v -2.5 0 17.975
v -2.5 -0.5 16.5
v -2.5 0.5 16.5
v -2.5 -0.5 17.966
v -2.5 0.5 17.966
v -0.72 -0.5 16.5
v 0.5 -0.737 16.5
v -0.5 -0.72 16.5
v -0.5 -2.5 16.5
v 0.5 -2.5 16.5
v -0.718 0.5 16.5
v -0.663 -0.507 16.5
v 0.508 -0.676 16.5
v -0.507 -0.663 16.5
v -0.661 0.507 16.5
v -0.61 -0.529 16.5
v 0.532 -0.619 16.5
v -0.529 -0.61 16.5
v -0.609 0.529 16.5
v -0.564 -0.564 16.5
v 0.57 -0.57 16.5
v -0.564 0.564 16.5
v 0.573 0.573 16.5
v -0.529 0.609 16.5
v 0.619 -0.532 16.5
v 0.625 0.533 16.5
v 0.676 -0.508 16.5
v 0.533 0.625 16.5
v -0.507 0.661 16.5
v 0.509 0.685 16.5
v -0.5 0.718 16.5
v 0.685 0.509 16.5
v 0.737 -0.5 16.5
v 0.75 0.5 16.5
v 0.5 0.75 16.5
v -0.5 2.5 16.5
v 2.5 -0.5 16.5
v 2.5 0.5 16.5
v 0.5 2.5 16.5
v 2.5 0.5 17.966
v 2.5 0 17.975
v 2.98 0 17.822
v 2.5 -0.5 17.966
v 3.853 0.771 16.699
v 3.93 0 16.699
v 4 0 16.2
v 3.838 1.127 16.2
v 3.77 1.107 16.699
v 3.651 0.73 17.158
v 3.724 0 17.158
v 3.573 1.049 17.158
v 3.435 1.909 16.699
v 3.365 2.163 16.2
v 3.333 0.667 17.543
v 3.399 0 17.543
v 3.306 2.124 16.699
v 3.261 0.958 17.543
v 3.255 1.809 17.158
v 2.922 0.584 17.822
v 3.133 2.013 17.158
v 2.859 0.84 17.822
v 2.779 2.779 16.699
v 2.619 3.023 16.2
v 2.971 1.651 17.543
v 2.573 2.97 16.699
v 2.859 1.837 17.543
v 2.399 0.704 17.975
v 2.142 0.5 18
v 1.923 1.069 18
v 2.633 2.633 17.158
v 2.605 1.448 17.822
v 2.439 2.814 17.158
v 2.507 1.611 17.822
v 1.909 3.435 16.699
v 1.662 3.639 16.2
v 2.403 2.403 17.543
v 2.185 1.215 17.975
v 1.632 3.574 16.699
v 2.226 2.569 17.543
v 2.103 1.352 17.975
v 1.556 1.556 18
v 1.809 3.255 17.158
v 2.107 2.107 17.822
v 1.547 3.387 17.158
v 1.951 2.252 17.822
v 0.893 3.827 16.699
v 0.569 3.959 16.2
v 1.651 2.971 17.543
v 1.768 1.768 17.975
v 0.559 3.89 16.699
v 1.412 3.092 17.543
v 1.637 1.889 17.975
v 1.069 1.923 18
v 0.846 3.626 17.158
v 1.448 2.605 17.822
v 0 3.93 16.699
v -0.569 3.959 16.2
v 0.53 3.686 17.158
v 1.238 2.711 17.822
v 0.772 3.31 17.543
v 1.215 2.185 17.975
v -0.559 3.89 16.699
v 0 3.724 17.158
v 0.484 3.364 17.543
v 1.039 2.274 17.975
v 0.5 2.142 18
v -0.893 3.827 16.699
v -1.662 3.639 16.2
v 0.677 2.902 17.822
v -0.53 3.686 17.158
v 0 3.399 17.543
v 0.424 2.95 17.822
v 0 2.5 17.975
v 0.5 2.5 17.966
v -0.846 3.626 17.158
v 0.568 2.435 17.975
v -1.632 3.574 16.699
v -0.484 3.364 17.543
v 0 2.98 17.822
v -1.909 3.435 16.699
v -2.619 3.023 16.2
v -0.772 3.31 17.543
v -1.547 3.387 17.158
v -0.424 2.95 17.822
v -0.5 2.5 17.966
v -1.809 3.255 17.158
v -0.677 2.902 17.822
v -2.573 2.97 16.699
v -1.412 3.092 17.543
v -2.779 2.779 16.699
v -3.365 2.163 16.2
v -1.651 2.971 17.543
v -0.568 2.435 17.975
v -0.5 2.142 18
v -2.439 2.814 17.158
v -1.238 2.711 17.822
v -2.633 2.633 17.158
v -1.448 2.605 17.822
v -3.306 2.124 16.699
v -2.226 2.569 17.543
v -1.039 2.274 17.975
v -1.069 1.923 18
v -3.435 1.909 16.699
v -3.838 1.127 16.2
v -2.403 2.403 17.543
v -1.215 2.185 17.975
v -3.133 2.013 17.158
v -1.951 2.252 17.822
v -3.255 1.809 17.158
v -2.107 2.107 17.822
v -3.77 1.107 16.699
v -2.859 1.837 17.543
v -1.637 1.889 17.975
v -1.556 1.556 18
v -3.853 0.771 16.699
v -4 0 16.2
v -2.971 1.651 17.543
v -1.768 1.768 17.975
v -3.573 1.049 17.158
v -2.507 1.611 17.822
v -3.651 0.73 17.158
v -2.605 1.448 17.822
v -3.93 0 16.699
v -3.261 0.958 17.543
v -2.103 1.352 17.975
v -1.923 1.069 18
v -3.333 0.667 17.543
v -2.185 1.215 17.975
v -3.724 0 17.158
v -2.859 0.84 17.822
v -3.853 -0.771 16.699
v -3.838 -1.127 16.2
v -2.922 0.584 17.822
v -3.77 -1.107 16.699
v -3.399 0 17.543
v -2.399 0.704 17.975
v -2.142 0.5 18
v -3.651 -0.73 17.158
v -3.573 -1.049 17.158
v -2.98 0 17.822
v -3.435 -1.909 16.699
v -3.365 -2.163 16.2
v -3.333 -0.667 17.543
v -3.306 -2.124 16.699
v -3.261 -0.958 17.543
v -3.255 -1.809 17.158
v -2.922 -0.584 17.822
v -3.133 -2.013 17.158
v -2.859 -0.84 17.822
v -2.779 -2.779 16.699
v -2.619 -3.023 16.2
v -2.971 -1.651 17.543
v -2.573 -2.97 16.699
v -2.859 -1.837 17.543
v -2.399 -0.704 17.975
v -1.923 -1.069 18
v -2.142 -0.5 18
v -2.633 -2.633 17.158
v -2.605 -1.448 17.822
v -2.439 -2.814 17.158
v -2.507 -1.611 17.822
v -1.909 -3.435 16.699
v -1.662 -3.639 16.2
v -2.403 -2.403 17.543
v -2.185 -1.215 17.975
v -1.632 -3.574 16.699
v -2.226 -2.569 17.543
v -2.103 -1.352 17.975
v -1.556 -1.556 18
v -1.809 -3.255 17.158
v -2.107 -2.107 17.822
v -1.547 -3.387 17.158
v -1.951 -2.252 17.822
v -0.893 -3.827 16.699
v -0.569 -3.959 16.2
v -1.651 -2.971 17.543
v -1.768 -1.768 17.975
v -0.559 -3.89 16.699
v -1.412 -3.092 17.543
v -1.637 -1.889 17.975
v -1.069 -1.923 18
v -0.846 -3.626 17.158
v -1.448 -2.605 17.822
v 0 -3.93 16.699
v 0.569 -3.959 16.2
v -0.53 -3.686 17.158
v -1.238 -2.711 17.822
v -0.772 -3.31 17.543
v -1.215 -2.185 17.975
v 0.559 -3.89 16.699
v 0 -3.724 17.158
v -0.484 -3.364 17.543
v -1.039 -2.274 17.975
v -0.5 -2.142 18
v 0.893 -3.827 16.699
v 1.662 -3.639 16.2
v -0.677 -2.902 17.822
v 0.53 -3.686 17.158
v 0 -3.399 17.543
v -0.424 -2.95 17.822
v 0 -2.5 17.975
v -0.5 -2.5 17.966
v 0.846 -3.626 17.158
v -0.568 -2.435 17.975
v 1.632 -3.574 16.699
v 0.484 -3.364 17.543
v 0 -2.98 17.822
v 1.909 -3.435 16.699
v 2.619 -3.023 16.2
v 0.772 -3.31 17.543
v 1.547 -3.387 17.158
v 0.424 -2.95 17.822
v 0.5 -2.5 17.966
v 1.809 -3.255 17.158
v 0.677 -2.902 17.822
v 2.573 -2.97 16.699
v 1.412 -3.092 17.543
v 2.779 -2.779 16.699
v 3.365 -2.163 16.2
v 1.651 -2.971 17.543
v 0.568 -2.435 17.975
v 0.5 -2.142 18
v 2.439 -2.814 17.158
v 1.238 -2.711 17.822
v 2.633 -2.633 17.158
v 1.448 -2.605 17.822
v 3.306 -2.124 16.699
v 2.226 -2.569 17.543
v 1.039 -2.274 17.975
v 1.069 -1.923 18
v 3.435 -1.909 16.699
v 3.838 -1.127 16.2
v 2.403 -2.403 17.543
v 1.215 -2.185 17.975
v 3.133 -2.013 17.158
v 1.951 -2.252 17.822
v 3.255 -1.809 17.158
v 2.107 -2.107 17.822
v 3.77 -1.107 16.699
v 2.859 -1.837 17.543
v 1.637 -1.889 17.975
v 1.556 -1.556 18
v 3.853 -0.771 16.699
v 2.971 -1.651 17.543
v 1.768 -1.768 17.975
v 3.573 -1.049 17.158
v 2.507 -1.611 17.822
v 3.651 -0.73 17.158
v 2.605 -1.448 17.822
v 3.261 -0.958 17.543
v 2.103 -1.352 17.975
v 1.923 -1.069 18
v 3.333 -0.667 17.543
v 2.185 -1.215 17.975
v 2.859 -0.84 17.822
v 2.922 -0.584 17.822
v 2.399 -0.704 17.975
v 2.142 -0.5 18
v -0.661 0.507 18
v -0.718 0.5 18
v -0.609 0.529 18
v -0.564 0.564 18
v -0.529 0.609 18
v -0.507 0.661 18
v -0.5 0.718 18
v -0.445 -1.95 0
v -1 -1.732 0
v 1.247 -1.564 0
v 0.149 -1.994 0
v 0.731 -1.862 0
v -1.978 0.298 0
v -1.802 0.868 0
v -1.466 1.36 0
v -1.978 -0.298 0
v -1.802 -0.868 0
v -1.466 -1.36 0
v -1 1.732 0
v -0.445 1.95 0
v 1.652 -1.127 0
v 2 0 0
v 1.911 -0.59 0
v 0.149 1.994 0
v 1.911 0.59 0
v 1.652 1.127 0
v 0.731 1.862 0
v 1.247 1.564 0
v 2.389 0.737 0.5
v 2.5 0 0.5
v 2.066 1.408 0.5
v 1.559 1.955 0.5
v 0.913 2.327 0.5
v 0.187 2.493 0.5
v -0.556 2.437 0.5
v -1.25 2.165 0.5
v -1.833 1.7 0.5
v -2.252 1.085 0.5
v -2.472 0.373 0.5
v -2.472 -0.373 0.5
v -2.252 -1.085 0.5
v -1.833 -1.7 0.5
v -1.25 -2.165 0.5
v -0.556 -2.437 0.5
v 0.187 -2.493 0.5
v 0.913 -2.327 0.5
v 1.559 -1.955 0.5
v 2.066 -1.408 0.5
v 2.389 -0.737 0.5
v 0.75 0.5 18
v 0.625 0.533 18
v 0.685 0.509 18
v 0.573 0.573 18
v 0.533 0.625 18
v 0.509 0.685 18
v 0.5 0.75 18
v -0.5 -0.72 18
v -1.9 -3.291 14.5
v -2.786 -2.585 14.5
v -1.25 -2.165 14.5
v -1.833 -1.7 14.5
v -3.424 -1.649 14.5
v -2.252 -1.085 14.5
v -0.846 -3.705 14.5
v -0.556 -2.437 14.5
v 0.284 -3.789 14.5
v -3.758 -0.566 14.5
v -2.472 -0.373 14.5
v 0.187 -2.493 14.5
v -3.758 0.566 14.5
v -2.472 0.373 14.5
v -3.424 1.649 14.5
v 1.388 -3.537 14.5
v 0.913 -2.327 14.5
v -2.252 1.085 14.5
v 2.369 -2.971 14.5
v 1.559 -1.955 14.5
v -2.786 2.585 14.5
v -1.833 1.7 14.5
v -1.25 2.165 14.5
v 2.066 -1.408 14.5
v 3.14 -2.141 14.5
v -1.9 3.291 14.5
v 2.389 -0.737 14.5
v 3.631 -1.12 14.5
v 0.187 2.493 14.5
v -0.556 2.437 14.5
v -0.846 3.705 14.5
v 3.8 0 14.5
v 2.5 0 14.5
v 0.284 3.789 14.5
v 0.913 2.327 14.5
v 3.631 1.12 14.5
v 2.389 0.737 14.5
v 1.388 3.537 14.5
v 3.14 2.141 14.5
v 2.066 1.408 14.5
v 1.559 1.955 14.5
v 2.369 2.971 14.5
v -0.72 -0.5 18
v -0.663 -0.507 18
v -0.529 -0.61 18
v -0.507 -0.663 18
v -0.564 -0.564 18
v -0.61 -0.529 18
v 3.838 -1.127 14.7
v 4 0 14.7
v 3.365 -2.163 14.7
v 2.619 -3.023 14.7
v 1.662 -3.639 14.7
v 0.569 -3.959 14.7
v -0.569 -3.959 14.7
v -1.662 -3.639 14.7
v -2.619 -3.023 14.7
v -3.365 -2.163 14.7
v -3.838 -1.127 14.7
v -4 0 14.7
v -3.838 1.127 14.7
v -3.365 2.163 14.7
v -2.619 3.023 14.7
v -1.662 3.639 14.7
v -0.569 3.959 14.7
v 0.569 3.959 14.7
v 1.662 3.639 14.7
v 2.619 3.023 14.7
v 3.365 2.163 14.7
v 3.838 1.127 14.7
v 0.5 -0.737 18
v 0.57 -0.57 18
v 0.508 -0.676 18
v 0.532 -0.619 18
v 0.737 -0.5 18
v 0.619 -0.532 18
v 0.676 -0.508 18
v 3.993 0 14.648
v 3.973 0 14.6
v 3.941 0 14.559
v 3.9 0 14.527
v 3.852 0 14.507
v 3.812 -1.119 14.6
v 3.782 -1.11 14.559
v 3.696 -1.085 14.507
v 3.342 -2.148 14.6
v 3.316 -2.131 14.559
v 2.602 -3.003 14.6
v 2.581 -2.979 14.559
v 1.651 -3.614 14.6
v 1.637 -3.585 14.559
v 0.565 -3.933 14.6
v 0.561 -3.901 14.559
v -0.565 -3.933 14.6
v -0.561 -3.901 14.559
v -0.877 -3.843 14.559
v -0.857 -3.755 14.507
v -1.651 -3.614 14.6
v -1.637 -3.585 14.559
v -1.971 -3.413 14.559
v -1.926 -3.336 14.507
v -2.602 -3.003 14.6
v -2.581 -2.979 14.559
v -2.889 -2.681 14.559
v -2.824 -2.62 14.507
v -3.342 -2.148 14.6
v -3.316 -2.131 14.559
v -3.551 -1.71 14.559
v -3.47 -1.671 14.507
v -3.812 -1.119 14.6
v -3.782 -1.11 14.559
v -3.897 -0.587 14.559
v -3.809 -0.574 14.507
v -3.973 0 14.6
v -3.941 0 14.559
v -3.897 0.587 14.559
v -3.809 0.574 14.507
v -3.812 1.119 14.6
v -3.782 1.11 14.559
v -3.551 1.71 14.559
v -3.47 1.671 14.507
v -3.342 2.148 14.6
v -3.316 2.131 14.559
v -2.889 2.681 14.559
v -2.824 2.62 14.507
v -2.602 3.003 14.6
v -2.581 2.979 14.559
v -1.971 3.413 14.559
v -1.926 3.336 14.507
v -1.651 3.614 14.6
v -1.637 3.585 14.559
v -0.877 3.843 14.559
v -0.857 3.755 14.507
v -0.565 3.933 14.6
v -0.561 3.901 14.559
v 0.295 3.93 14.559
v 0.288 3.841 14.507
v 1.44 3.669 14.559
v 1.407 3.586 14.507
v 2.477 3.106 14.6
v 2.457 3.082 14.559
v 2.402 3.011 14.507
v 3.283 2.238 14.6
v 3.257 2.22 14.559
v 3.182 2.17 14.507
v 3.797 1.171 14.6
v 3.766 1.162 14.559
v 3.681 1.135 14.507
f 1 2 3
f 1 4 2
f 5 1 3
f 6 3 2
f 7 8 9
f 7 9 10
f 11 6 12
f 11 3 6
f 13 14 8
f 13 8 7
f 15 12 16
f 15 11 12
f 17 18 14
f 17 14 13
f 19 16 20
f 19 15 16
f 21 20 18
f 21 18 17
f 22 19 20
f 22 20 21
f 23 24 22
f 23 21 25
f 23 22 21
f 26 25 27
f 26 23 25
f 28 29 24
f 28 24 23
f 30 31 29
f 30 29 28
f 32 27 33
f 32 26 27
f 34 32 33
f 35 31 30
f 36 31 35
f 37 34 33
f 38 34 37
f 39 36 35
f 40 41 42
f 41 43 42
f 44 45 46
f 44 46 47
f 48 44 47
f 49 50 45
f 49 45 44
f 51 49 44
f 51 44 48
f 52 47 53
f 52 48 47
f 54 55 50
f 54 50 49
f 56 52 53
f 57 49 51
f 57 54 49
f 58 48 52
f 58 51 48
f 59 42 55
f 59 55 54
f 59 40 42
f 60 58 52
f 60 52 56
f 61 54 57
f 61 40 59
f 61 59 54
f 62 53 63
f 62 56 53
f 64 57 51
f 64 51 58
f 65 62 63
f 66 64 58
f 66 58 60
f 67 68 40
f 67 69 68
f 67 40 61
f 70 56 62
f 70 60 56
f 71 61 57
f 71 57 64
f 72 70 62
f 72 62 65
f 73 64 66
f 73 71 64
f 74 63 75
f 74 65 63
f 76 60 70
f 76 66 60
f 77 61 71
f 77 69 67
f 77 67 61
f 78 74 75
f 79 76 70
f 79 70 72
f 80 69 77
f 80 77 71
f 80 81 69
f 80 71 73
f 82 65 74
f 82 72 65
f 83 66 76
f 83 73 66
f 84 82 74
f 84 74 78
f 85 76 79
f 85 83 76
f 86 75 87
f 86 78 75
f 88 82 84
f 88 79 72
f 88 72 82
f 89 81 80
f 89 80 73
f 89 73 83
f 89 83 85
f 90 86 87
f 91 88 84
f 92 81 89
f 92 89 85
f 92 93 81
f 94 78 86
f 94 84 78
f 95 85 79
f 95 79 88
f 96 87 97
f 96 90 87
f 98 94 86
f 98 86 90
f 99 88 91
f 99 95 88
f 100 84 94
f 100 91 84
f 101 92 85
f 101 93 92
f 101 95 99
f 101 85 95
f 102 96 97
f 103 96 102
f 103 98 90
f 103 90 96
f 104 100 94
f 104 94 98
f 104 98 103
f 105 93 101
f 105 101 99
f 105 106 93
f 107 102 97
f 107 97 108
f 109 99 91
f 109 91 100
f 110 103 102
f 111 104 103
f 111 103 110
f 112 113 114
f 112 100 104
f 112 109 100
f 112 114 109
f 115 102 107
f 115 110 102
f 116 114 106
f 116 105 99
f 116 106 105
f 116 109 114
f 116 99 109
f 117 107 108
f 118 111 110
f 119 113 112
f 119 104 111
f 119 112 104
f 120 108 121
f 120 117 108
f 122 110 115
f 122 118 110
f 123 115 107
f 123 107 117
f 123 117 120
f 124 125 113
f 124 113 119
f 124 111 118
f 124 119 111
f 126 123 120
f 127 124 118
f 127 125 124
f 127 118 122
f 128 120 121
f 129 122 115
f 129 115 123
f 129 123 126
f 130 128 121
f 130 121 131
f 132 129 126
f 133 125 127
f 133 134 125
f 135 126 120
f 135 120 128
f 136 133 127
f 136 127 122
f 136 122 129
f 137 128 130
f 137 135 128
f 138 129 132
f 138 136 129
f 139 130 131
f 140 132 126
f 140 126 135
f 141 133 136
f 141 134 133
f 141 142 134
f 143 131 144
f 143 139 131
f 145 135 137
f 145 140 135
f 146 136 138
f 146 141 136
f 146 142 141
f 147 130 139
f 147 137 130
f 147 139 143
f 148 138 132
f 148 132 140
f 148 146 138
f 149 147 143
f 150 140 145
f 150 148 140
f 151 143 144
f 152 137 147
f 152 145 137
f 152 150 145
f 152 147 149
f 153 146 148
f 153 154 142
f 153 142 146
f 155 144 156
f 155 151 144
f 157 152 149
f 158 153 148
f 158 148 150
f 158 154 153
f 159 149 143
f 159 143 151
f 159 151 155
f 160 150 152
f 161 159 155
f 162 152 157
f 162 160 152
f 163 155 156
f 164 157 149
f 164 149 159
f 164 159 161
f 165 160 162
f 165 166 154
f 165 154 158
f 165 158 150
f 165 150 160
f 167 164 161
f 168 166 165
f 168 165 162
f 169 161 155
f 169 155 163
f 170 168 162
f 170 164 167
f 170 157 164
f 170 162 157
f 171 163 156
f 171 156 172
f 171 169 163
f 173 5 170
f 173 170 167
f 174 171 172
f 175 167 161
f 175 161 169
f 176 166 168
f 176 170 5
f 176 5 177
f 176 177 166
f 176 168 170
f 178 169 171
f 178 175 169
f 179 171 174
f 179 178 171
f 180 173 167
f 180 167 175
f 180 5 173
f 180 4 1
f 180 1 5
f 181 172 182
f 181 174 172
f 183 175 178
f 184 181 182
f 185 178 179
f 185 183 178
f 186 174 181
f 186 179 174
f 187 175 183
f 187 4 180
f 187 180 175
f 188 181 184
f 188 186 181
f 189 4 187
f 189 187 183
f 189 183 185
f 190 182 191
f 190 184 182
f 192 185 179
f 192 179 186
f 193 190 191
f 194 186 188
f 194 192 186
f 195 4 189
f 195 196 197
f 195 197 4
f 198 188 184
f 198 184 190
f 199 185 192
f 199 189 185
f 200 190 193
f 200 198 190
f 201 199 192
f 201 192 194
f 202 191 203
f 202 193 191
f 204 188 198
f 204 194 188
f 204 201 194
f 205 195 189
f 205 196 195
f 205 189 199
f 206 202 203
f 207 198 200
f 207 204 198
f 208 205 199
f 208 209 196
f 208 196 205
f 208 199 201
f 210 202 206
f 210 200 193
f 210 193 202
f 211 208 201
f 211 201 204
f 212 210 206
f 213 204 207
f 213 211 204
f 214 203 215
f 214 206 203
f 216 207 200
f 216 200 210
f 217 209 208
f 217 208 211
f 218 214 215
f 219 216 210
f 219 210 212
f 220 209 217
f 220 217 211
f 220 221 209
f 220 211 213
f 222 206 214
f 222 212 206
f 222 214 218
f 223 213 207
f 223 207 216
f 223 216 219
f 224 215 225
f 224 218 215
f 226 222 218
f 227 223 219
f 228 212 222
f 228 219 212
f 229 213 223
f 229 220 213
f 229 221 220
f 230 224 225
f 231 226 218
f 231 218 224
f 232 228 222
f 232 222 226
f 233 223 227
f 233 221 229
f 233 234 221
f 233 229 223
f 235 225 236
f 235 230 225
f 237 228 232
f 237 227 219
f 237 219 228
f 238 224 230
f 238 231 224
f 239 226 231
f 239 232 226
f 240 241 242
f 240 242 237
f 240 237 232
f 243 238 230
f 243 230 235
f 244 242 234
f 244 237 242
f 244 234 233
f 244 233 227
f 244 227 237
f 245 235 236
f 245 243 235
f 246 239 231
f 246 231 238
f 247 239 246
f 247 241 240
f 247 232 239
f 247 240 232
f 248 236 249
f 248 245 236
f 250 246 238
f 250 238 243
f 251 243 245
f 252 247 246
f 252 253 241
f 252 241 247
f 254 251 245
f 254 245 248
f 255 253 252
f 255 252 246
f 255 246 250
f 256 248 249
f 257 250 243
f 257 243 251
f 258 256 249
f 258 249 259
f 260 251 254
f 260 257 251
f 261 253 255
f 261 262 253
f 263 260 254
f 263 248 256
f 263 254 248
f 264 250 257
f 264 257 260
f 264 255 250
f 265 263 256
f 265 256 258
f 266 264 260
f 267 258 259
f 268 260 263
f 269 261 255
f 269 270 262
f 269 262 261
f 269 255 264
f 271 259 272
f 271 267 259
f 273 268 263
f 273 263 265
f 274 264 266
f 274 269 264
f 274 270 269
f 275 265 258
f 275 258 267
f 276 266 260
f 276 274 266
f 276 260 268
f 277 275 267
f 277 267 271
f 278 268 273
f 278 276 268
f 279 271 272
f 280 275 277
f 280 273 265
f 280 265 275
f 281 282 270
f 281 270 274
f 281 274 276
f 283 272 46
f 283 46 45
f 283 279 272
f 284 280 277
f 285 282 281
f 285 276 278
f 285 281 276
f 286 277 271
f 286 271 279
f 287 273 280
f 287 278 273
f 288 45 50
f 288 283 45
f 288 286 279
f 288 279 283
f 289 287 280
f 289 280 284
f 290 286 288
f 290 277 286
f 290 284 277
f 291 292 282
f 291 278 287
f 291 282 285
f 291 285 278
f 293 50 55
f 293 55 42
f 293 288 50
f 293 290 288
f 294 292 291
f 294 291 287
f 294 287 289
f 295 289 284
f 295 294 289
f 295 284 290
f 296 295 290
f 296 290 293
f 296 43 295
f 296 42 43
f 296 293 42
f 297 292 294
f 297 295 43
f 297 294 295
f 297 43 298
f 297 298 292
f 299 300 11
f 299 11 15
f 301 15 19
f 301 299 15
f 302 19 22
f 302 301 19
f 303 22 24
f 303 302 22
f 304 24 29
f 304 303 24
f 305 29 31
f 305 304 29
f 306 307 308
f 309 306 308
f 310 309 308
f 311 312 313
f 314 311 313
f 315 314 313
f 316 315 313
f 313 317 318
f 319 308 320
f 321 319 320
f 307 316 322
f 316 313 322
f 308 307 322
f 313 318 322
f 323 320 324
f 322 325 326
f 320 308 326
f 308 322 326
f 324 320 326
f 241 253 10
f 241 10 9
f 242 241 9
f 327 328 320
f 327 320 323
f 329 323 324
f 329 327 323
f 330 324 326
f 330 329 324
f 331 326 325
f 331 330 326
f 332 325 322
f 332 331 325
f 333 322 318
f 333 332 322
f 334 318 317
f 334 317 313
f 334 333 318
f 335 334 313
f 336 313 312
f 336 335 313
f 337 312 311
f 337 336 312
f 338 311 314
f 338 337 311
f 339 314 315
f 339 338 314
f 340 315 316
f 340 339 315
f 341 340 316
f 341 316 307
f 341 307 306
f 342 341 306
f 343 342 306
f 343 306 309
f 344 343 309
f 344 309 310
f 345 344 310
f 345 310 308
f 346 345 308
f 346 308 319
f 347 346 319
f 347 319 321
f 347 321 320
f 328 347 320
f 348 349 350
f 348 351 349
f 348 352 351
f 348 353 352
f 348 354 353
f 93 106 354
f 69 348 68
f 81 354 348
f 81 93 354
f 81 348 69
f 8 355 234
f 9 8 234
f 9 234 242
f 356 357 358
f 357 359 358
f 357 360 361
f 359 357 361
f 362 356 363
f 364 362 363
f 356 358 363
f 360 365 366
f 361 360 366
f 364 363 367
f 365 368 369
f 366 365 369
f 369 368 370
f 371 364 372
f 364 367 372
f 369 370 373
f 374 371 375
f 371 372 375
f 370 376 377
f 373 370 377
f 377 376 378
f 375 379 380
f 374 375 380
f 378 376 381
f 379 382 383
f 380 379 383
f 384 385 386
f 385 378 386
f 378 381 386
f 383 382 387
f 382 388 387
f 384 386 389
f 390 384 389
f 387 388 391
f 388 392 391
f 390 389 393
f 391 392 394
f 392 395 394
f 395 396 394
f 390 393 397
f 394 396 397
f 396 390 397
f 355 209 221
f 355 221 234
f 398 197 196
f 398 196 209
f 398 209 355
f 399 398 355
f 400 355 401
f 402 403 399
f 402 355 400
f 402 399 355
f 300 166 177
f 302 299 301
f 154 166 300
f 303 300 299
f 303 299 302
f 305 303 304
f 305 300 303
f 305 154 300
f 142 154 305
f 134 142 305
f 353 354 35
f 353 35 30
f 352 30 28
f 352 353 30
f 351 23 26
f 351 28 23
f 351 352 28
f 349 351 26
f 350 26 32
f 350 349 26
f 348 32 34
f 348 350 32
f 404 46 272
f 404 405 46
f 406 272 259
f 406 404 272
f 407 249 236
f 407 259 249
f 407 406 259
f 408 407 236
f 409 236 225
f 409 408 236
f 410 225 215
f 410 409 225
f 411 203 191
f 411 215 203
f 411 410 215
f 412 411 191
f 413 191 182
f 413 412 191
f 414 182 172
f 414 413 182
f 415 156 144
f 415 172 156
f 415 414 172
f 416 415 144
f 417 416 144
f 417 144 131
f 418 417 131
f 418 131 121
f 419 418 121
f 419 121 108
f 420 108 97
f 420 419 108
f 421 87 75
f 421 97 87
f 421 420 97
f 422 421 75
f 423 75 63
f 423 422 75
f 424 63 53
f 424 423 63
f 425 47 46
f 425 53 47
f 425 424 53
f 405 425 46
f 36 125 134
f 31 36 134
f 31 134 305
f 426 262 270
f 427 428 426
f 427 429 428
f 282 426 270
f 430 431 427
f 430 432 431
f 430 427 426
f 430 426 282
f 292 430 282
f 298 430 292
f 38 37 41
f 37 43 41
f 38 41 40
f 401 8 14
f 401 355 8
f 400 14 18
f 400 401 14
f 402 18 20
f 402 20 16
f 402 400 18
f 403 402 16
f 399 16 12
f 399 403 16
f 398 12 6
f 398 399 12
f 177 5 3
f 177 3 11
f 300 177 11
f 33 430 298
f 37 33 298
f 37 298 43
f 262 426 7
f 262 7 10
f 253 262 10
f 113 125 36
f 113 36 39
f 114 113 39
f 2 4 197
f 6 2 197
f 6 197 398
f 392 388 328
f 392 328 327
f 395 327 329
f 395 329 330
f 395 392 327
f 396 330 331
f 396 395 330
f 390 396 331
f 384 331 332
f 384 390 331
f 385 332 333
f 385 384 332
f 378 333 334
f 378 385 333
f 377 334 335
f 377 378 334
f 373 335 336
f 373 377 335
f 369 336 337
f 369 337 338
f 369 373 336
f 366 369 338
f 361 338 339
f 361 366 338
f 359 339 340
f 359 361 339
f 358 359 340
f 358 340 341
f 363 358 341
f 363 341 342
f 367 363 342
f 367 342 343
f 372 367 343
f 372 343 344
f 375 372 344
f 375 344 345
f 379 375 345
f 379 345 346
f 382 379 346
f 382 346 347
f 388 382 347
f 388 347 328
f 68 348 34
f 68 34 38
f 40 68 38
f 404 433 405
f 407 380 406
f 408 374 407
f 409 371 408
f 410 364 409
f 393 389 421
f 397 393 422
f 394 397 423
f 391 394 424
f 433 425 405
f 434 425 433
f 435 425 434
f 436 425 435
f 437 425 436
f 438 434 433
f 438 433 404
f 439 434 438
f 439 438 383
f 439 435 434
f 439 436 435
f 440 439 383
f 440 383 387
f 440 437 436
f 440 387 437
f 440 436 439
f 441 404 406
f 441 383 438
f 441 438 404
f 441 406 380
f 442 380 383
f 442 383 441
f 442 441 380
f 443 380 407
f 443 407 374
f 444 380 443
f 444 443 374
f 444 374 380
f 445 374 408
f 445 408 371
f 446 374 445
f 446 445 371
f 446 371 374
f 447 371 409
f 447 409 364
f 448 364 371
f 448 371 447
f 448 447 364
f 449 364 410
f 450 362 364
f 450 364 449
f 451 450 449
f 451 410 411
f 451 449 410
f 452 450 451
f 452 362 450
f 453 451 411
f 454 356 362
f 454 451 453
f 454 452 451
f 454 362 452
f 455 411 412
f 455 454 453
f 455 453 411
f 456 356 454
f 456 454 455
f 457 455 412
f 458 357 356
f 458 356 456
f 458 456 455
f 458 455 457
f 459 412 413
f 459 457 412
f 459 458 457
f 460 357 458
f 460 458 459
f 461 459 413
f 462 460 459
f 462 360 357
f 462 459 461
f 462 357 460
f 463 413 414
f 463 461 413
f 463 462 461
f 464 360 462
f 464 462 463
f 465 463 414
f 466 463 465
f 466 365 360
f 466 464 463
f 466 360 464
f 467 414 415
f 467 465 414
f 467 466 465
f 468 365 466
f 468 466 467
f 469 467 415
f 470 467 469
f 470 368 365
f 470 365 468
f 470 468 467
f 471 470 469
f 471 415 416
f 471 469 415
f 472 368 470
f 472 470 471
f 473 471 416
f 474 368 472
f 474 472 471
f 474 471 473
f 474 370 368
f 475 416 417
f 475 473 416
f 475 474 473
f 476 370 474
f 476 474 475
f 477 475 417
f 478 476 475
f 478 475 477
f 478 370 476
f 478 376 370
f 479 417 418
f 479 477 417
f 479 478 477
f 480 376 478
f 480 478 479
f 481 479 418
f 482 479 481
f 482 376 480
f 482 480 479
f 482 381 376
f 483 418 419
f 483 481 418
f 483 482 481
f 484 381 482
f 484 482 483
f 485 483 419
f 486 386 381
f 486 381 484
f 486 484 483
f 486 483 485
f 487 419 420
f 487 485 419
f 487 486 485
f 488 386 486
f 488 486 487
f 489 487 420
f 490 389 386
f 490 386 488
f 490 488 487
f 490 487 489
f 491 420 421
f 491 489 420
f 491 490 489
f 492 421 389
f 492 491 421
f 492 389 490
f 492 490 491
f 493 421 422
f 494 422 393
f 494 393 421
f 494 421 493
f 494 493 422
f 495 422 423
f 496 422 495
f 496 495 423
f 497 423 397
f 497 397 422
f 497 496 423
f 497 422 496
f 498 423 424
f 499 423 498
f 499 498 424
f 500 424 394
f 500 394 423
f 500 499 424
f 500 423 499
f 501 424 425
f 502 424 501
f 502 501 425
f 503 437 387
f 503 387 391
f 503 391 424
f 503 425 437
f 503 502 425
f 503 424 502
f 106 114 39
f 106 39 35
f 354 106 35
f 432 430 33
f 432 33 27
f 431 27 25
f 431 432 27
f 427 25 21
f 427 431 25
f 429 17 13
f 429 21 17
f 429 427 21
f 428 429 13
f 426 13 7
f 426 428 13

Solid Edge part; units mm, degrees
sketch "Sketch1" plane through (0, 0, 0) normal (0, -1, 0) x (1, 0, 0)
  line L0 (0, 0) -> (0, 18)
  line L1 (0, 18) -> (4, 18)
  line L2 (4, 18) -> (4, 14.5)
  line L3 (4, 14.5) -> (2.5, 14.5)
  line L4 (2.5, 0) -> (2.5, 14.5)
  line L5 (0, 0) -> (2.5, 0)
revolve "RevolvedProtrusion1" add sketch "Sketch1" angle 360 about axis through (0, 0, 0) along (0, 0, 1)
chamfer "Chamfer1" distance 0.5 angle 45 1 edges at (-2.5, 0, 0)
cosmetic_thread "Thread1" size "M5"
fillet "Lekerekítés_1" radius 1.8 1 edges at (-4, 0, 18)
fillet "Lekerekítés_3" radius 0.2 1 edges at (-4, 0, 14.5)
sketch "Sketch2" plane through (0, 0, 18) normal (0, 0, 1) x (0, -1, 0)
  line L0 (0, -2.5) -> (0.5, -2.5)
  line L1 (0.5, -2.5) -> (0.5, -0.7199)
  arc A0 (0.7199, -0.5) -> (0.5, -0.7199) centre (0.7199, -0.7199) ccw
  line L2 (0.7199, -0.5) -> (2.5, -0.5)
  line L3 (2.5, 0) -> (2.5, -0.5)
  line L4 (2.5, 0) -> (2.5, 0.5)
  line L5 (0.7371, 0.5) -> (2.5, 0.5)
  arc A1 (0.7371, 0.5) -> (0.5, 0.7371) centre (0.7371, 0.7371) cw
  line L6 (0.5, 0.7371) -> (0.5, 2.5)
  line L7 (0, 2.5) -> (0.5, 2.5)
  line L8 (0, 2.5) -> (-0.5, 2.5)
  line L9 (-0.5, 0.7495) -> (-0.5, 2.5)
  arc A2 (-0.5, 0.7495) -> (-0.7495, 0.5) centre (-0.7495, 0.7495) cw
  line L10 (-2.5, 0.5) -> (-0.7495, 0.5)
  line L11 (-2.5, 0) -> (-2.5, 0.5)
  line L12 (-2.5, 0) -> (-2.5, -0.5)
  line L13 (-2.5, -0.5) -> (-0.7175, -0.5)
  arc A3 (-0.5, -0.7175) -> (-0.7175, -0.5) centre (-0.7175, -0.7175) ccw
  line L14 (-0.5, -2.5) -> (-0.5, -0.7175)
  line L15 (0, -2.5) -> (-0.5, -2.5)
extrude "Kivágás_1" cut sketch "Sketch2" against normal blind 1.5
